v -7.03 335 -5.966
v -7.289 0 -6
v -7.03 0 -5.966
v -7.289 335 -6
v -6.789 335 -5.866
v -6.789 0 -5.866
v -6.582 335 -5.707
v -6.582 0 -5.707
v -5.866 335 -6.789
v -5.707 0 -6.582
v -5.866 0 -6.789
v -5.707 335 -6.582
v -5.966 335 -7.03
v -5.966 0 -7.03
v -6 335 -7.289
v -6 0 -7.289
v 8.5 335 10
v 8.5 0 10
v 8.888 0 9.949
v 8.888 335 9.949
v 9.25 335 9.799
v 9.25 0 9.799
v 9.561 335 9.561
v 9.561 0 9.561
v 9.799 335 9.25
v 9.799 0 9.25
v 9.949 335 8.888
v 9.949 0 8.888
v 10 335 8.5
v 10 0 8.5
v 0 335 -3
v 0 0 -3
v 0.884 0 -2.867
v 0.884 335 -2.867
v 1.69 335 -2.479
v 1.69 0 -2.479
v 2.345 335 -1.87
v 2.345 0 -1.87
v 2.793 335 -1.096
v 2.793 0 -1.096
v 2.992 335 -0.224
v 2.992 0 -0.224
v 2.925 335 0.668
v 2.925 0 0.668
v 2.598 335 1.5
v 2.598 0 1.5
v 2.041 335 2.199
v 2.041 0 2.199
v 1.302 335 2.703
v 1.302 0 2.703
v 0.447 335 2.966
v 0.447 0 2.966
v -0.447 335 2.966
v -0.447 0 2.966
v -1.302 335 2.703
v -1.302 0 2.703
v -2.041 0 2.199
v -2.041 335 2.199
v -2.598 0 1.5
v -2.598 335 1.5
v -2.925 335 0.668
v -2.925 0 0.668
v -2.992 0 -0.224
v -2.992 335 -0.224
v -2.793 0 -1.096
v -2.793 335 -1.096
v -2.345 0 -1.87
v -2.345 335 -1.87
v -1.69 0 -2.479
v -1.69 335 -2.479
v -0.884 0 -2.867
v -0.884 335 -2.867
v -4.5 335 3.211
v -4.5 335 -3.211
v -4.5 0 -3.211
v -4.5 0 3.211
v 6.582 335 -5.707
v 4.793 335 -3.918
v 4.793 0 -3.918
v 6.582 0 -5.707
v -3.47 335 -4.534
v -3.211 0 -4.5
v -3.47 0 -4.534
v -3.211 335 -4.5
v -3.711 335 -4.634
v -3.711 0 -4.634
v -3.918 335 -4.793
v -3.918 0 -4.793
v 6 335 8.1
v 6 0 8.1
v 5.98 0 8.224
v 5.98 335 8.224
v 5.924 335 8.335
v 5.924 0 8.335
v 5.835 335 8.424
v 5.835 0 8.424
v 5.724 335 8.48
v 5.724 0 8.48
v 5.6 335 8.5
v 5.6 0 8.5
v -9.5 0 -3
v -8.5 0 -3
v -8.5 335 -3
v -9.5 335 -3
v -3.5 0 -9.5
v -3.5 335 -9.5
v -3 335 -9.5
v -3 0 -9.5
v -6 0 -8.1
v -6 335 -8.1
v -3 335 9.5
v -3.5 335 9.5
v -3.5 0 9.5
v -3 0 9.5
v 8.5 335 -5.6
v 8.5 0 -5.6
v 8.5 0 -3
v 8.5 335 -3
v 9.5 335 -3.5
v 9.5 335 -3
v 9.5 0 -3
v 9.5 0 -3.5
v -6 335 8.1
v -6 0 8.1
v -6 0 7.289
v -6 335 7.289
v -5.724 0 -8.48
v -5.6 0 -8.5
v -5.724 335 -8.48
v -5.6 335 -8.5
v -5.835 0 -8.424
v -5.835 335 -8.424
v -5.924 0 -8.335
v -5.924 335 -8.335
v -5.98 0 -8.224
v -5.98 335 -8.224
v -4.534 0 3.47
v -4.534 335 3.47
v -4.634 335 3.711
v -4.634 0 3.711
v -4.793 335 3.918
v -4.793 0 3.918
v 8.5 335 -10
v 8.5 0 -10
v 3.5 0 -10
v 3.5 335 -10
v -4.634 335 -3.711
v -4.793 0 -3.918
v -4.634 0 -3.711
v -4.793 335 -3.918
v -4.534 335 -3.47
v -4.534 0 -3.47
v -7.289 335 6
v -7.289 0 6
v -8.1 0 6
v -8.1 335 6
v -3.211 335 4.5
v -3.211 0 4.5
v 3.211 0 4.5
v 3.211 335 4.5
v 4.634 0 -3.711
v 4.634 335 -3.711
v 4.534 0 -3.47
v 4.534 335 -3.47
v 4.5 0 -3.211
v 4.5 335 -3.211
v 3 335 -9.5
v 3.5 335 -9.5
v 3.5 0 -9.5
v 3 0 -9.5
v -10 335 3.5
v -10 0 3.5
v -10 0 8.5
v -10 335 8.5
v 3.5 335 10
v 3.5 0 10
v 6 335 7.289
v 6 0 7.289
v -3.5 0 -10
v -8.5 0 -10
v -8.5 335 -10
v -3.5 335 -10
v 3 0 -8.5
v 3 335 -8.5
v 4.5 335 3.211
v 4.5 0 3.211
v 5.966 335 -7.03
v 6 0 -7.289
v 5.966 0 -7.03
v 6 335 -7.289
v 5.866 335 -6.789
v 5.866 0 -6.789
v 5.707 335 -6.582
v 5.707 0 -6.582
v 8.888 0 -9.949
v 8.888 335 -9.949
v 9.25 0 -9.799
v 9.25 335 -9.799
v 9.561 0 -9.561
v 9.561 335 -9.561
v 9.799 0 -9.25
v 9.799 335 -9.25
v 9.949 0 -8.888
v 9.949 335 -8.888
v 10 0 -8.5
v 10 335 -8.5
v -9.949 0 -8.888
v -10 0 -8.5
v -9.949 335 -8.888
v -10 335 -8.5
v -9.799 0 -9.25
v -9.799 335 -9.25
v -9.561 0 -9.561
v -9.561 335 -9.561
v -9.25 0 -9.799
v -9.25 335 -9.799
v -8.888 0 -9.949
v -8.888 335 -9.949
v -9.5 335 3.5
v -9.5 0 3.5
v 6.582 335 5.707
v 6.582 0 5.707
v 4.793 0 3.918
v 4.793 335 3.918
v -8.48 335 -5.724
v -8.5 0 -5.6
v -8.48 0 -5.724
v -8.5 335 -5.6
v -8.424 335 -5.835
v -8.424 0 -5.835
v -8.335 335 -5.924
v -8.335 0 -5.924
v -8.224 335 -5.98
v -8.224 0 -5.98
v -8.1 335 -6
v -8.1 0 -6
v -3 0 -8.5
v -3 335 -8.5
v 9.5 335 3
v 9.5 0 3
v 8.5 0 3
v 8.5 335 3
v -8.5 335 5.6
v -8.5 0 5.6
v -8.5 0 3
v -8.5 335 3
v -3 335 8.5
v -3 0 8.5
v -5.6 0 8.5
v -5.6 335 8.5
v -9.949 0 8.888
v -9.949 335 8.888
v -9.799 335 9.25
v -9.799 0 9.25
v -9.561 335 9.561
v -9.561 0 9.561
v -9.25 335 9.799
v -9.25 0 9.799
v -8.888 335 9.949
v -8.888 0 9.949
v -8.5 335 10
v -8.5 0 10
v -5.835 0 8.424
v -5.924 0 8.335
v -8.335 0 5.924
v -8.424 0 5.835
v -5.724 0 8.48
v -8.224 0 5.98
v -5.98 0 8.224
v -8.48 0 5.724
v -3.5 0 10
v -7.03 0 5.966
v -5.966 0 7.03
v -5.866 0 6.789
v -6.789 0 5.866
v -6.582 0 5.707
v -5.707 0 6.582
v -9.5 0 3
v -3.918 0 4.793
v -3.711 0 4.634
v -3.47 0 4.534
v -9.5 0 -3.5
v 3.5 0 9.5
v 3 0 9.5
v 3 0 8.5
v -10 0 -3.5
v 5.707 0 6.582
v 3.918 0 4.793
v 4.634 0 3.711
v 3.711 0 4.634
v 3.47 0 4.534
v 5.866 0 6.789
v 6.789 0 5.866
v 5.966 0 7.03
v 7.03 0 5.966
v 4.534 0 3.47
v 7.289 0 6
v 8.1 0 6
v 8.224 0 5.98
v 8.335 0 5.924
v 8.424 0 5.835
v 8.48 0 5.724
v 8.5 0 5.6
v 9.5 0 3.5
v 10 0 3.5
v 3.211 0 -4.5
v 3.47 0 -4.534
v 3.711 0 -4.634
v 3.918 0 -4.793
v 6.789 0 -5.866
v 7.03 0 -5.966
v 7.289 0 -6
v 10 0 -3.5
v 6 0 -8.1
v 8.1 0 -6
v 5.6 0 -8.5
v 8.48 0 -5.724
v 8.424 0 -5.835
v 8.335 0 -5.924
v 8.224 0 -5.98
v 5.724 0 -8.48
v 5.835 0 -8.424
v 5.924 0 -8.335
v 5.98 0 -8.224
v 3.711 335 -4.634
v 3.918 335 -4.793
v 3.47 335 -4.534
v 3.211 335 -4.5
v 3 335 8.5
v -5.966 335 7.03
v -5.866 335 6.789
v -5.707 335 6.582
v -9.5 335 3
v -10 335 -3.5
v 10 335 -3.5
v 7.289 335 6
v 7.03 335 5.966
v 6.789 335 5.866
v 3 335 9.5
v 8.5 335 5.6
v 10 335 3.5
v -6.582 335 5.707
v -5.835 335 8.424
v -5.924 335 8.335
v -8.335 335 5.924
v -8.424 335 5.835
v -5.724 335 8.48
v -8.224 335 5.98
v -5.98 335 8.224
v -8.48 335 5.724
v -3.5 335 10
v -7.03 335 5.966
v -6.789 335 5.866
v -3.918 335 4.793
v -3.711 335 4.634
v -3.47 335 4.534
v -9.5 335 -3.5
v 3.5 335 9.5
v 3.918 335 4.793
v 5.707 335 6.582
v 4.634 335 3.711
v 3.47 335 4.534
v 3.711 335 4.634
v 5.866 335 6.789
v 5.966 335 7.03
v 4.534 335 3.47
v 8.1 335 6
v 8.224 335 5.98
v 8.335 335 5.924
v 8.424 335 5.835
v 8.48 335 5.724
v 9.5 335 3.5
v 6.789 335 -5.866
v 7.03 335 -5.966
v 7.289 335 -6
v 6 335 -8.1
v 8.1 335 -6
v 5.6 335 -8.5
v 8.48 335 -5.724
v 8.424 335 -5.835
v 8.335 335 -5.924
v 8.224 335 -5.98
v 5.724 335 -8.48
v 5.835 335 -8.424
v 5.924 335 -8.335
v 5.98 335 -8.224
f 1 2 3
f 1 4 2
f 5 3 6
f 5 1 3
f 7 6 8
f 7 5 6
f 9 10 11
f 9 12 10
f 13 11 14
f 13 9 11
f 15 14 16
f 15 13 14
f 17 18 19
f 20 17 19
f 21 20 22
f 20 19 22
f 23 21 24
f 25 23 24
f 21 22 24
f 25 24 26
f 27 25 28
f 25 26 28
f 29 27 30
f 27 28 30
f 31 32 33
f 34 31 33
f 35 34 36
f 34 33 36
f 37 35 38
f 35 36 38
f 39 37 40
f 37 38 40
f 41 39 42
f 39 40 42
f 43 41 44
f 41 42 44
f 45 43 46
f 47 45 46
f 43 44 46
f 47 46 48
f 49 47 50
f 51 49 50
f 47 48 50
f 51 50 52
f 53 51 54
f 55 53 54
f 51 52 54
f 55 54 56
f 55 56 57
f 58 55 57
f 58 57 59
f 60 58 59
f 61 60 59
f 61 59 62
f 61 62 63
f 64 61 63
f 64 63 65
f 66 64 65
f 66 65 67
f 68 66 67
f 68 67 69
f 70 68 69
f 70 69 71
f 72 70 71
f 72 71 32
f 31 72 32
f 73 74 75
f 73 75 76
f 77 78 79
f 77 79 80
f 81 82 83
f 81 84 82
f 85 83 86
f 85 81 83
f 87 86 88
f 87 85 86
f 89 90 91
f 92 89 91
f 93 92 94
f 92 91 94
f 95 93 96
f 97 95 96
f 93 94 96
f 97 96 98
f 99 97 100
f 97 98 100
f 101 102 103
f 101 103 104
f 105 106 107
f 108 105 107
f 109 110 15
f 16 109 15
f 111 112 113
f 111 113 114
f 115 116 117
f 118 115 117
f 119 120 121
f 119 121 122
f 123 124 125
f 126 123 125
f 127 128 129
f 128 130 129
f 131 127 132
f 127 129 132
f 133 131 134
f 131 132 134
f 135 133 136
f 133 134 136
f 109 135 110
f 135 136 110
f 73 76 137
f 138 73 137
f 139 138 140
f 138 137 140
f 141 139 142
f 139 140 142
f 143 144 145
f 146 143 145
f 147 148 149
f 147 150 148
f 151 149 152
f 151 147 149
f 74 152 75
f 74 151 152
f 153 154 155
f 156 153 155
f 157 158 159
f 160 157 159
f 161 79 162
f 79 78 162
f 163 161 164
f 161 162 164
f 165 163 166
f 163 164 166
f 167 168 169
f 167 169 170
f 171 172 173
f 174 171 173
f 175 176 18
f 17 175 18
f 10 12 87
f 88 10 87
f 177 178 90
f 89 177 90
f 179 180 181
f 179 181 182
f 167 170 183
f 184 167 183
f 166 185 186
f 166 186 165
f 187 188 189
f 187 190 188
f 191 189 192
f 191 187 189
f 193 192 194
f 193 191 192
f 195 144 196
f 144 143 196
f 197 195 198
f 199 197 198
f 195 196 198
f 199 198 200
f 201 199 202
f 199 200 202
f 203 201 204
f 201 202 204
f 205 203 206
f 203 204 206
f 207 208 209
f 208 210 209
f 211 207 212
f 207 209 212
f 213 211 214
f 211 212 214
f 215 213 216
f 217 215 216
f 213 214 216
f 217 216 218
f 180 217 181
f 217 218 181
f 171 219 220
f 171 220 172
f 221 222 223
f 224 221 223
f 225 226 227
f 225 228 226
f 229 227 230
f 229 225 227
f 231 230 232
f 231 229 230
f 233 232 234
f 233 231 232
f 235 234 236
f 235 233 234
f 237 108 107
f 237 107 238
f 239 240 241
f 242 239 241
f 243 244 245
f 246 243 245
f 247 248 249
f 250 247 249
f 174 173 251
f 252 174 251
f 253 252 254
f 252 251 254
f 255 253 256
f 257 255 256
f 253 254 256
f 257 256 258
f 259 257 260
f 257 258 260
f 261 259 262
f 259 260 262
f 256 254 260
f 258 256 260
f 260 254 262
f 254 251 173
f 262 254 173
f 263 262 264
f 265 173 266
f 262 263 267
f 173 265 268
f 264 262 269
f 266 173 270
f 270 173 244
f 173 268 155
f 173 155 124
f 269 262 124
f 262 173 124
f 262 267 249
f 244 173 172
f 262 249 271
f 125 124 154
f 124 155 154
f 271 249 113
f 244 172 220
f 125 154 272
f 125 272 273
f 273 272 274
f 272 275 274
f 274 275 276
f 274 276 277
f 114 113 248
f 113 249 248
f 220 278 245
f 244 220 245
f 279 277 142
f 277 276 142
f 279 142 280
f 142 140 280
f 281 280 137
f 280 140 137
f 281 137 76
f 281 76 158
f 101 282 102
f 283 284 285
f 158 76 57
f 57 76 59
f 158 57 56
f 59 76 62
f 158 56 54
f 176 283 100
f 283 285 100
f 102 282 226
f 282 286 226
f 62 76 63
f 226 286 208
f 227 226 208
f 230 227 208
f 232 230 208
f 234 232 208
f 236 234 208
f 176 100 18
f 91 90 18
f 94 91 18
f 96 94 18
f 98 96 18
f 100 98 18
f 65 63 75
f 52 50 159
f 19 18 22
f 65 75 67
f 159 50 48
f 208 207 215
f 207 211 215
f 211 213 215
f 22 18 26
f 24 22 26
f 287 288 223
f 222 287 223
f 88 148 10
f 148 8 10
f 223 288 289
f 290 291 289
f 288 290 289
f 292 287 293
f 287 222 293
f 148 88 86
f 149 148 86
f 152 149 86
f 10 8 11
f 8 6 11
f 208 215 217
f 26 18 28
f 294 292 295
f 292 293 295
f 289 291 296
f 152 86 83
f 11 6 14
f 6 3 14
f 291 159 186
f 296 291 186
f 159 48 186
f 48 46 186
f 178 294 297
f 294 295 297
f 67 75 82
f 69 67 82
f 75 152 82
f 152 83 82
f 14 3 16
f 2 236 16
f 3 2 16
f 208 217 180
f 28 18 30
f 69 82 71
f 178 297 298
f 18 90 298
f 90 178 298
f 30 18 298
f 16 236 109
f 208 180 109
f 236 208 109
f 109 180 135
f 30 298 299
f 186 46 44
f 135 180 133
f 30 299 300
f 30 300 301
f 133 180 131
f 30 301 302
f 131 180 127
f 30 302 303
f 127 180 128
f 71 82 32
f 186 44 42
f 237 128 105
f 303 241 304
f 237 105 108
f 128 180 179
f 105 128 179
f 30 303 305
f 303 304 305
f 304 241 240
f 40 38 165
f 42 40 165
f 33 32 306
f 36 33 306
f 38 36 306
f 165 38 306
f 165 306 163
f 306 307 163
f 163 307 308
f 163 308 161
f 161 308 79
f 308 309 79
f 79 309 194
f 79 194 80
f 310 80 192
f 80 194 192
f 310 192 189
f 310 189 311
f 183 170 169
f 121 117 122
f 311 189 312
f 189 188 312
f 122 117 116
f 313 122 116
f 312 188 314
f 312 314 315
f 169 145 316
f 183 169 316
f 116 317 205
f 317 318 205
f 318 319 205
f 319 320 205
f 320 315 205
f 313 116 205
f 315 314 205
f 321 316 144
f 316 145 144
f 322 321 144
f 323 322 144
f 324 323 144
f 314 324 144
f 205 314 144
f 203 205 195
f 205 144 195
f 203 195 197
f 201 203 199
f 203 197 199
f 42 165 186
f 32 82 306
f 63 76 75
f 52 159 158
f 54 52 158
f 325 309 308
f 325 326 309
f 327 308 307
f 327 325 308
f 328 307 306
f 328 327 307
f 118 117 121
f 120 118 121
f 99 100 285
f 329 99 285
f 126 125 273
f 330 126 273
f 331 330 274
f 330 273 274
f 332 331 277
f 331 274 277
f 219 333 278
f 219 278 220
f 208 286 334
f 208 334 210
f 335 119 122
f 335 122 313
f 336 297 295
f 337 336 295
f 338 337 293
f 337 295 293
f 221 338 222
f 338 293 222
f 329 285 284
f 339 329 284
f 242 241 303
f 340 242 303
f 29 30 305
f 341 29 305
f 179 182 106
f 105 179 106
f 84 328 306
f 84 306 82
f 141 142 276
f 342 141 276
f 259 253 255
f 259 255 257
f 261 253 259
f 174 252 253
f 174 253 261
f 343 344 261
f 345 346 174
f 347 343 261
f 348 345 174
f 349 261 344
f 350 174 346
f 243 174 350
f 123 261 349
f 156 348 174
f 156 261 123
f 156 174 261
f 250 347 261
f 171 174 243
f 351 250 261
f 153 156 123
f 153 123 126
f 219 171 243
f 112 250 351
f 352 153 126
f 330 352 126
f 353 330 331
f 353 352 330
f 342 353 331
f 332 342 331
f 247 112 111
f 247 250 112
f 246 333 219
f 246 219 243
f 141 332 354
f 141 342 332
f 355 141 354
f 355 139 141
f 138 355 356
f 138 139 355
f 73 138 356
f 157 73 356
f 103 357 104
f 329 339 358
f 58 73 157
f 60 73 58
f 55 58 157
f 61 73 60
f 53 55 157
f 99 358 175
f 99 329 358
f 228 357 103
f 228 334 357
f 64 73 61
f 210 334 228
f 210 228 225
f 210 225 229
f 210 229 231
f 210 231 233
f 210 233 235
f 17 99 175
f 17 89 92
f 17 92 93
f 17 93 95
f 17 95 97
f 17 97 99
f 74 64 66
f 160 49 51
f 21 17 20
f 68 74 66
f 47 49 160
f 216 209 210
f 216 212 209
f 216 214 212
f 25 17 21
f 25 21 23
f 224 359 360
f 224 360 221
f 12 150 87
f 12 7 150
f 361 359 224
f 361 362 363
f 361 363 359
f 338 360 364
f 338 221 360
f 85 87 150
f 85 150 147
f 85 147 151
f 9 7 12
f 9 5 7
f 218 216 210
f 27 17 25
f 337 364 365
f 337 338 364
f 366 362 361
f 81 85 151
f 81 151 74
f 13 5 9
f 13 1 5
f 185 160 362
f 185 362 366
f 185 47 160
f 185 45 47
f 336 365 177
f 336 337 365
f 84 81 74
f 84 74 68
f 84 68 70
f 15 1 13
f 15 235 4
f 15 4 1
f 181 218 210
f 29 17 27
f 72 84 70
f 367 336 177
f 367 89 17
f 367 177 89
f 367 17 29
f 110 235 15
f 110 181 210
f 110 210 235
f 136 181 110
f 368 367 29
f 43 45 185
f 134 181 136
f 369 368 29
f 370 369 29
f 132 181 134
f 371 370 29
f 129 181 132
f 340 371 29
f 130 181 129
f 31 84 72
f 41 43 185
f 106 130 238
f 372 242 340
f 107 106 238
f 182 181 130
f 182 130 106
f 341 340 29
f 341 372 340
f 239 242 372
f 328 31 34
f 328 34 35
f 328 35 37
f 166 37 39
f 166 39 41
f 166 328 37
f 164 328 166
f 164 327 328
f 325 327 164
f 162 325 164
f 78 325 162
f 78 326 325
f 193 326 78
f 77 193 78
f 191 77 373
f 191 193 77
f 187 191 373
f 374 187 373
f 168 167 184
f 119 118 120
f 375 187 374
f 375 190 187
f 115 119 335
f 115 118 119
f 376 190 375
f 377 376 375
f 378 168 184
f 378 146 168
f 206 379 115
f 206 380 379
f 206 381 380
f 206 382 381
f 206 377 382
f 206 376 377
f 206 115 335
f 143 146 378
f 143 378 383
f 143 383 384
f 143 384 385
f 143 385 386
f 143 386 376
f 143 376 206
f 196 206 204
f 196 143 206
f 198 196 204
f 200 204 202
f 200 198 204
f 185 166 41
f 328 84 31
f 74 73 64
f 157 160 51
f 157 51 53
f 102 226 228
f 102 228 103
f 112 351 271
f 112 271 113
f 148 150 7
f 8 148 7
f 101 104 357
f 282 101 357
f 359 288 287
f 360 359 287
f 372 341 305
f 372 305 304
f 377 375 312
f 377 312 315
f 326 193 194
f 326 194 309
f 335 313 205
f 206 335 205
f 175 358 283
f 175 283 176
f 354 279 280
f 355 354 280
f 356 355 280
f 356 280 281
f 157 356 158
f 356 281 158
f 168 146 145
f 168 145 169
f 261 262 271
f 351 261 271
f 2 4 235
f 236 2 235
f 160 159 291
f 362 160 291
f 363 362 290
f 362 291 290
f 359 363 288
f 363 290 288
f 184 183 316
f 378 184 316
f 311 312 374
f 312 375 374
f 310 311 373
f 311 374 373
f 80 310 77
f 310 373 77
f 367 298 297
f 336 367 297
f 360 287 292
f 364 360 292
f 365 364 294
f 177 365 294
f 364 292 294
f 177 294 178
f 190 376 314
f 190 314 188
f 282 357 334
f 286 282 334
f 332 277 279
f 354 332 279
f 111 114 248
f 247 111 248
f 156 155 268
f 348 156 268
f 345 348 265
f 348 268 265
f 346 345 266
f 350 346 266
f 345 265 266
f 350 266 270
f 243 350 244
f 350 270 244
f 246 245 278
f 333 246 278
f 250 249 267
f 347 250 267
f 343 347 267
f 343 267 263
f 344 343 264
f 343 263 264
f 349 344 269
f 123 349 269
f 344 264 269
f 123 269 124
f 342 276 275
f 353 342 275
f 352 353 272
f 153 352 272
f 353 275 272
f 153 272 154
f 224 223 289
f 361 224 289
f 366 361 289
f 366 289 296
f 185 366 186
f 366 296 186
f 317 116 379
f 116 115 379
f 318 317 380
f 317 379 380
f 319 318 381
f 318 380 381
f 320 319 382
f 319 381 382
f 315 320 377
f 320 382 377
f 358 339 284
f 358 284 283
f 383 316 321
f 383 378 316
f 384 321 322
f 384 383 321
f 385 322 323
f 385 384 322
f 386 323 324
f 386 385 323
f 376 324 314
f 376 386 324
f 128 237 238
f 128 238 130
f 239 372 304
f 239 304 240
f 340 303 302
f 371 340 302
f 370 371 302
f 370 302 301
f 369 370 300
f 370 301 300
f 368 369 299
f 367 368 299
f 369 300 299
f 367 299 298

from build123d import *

# Parameters (mm, degrees)
BOSS_EXTRU_1_CORPS_DEPTH    = 335
CONG_1_R                    = 1.5
CONG_2_R                    = 0.4
CONG_4_R                    = 1
CONG_1_OF_SYM_TRIE_BRAS_R   = 1.5
CONG_2_OF_SYM_TRIE_BRAS_R   = 0.4
CONG_4_OF_SYM_TRIE_BRAS_R   = 1
SYM_TRIE_BRAS_DOUBLE_DEPTH  = 335
APR_S_TARODAGE_M6_R         = 3
ENL_V_MAT_FILETAGE_M6_DEPTH = 336.298374586


# Read off the part's stored shape, not the designer's step: Symétrie Bras double
with BuildPart() as part:
    # Esquisse4 → Boss.-Extru.1 Corps (new body)
    with BuildSketch(Plane(origin=(0, 0, 0), x_dir=(1, 0, 0), z_dir=(0, 1, 0))):
        Polygon((0, 0), (-4.5, 0), (-4.5, 3.625), (-6.875, 6), (-8.5, 6), (-8.5, 3), (-9.5, 3), (-9.5, 3.5), (-10, 3.5), (-10, 10), (-3.5, 10), (-3.5, 9.5), (-3, 9.5), (-3, 8.5), (-6, 8.5), (-6, 6.875), (-3.625, 4.5), (0, 4.5), align=None)
    boss_extru_1_corps = extrude(amount=BOSS_EXTRU_1_CORPS_DEPTH)

    # Congé1
    cong_1_edges = [part.edges().sort_by_distance(p)[0] for p in [
        (-10, 167.5, -10),
    ]]
    fillet(cong_1_edges, radius=CONG_1_R)

    # Congé2
    cong_2_edges = [part.edges().sort_by_distance(p)[0] for p in [
        (-8.5, 167.5, -6),
        (-6, 167.5, -8.5),
    ]]
    fillet(cong_2_edges, radius=CONG_2_R)

    # Congé4
    cong_4_edges = [part.edges().sort_by_distance(p)[0] for p in [
        (-4.5, 167.5, -3.625),
        (-6.875, 167.5, -6),
        (-6, 167.5, -6.875),
        (-3.625, 167.5, -4.5),
    ]]
    fillet(cong_4_edges, radius=CONG_4_R)

    # Symétrie Bras: Boss.-Extru.1 Corps across plane
    add(boss_extru_1_corps.mirror(Plane(origin=(0, 335, -4.5), x_dir=(0, 0, 1), z_dir=(-1, 0, 0))))

    # Congé1 of Symétrie Bras
    cong_1_of_sym_trie_bras_edges = [part.edges().sort_by_distance(p)[0] for p in [
        (10, 167.5, -10),
    ]]
    fillet(cong_1_of_sym_trie_bras_edges, radius=CONG_1_OF_SYM_TRIE_BRAS_R)

    # Congé2 of Symétrie Bras
    cong_2_of_sym_trie_bras_edges = [part.edges().sort_by_distance(p)[0] for p in [
        (8.5, 167.5, -6),
        (6, 167.5, -8.5),
    ]]
    fillet(cong_2_of_sym_trie_bras_edges, radius=CONG_2_OF_SYM_TRIE_BRAS_R)

    # Congé4 of Symétrie Bras
    cong_4_of_sym_trie_bras_edges = [part.edges().sort_by_distance(p)[0] for p in [
        (4.5, 167.5, -3.625),
        (6.875, 167.5, -6),
        (6, 167.5, -6.875),
        (3.625, 167.5, -4.5),
    ]]
    fillet(cong_4_of_sym_trie_bras_edges, radius=CONG_4_OF_SYM_TRIE_BRAS_R)

    # Symétrie Bras double outline → Symétrie Bras double (add)
    with BuildSketch(Plane(origin=(0, 0, 0), x_dir=(1, 0, 0), z_dir=(0, 1, 0))):
        with BuildLine():
            ThreePointArc((7.289213562, -6), (6.90653013, -5.923879533), (6.582106781, -5.707106781))
            Line((6.582106781, -5.707106781), (4.792893219, -3.917893219))
            ThreePointArc((4.792893219, -3.917893219), (4.576120467, -3.59346987), (4.5, -3.210786438))
            Line((4.5, -3.210786438), (4.5, 0))
            Line((4.5, 0), (-4.5, 0))
            Line((-4.5, 0), (-4.5, -3.210786438))
            ThreePointArc((-4.5, -3.210786438), (-4.576120467, -3.59346987), (-4.792893219, -3.917893219))
            Line((-4.792893219, -3.917893219), (-6.582106781, -5.707106781))
            ThreePointArc((-6.582106781, -5.707106781), (-6.90653013, -5.923879533), (-7.289213562, -6))
            Line((-7.289213562, -6), (-8.1, -6))
            ThreePointArc((-8.1, -6), (-8.382842712, -5.882842712), (-8.5, -5.6))
            Line((-8.5, -5.6), (-8.5, -3))
            Line((-8.5, -3), (-9.5, -3))
            Line((-9.5, -3), (-9.5, -3.5))
            Line((-9.5, -3.5), (-10, -3.5))
            Line((-10, -3.5), (-10, -8.5))
            ThreePointArc((-10, -8.5), (-9.560660172, -9.560660172), (-8.5, -10))
            Line((-8.5, -10), (-3.5, -10))
            Line((-3.5, -10), (-3.5, -9.5))
            Line((-3.5, -9.5), (-3, -9.5))
            Line((-3, -9.5), (-3, -8.5))
            Line((-3, -8.5), (-5.6, -8.5))
            ThreePointArc((-5.6, -8.5), (-5.882842712, -8.382842712), (-6, -8.1))
            Line((-6, -8.1), (-6, -7.289213562))
            ThreePointArc((-6, -7.289213562), (-5.923879533, -6.90653013), (-5.707106781, -6.582106781))
            Line((-5.707106781, -6.582106781), (-3.917893219, -4.792893219))
            ThreePointArc((-3.917893219, -4.792893219), (-3.59346987, -4.576120467), (-3.210786438, -4.5))
            Line((-3.210786438, -4.5), (3.210786438, -4.5))
            ThreePointArc((3.210786438, -4.5), (3.59346987, -4.576120467), (3.917893219, -4.792893219))
            Line((3.917893219, -4.792893219), (5.707106781, -6.582106781))
            ThreePointArc((5.707106781, -6.582106781), (5.923879533, -6.90653013), (6, -7.289213562))
            Line((6, -7.289213562), (6, -8.1))
            ThreePointArc((6, -8.1), (5.882842712, -8.382842712), (5.6, -8.5))
            Line((5.6, -8.5), (3, -8.5))
            Line((3, -8.5), (3, -9.5))
            Line((3, -9.5), (3.5, -9.5))
            Line((3.5, -9.5), (3.5, -10))
            Line((3.5, -10), (8.5, -10))
            ThreePointArc((8.5, -10), (9.560660172, -9.560660172), (10, -8.5))
            Line((10, -8.5), (10, -3.5))
            Line((10, -3.5), (9.5, -3.5))
            Line((9.5, -3.5), (9.5, -3))
            Line((9.5, -3), (8.5, -3))
            Line((8.5, -3), (8.5, -5.6))
            ThreePointArc((8.5, -5.6), (8.382842712, -5.882842712), (8.1, -6))
            Line((8.1, -6), (7.289213562, -6))
        make_face()
    extrude(amount=SYM_TRIE_BRAS_DOUBLE_DEPTH)

    # Après tarodage M6 → Enlèv. mat.-Filetage M6 (cut, through all)
    with BuildSketch(Plane.XZ):
        with Locations(Location((0, 0, 0), (0, 0, 270))):
            Circle(APR_S_TARODAGE_M6_R)
    extrude(amount=-ENL_V_MAT_FILETAGE_M6_DEPTH, mode=Mode.SUBTRACT)


solid = part.part
